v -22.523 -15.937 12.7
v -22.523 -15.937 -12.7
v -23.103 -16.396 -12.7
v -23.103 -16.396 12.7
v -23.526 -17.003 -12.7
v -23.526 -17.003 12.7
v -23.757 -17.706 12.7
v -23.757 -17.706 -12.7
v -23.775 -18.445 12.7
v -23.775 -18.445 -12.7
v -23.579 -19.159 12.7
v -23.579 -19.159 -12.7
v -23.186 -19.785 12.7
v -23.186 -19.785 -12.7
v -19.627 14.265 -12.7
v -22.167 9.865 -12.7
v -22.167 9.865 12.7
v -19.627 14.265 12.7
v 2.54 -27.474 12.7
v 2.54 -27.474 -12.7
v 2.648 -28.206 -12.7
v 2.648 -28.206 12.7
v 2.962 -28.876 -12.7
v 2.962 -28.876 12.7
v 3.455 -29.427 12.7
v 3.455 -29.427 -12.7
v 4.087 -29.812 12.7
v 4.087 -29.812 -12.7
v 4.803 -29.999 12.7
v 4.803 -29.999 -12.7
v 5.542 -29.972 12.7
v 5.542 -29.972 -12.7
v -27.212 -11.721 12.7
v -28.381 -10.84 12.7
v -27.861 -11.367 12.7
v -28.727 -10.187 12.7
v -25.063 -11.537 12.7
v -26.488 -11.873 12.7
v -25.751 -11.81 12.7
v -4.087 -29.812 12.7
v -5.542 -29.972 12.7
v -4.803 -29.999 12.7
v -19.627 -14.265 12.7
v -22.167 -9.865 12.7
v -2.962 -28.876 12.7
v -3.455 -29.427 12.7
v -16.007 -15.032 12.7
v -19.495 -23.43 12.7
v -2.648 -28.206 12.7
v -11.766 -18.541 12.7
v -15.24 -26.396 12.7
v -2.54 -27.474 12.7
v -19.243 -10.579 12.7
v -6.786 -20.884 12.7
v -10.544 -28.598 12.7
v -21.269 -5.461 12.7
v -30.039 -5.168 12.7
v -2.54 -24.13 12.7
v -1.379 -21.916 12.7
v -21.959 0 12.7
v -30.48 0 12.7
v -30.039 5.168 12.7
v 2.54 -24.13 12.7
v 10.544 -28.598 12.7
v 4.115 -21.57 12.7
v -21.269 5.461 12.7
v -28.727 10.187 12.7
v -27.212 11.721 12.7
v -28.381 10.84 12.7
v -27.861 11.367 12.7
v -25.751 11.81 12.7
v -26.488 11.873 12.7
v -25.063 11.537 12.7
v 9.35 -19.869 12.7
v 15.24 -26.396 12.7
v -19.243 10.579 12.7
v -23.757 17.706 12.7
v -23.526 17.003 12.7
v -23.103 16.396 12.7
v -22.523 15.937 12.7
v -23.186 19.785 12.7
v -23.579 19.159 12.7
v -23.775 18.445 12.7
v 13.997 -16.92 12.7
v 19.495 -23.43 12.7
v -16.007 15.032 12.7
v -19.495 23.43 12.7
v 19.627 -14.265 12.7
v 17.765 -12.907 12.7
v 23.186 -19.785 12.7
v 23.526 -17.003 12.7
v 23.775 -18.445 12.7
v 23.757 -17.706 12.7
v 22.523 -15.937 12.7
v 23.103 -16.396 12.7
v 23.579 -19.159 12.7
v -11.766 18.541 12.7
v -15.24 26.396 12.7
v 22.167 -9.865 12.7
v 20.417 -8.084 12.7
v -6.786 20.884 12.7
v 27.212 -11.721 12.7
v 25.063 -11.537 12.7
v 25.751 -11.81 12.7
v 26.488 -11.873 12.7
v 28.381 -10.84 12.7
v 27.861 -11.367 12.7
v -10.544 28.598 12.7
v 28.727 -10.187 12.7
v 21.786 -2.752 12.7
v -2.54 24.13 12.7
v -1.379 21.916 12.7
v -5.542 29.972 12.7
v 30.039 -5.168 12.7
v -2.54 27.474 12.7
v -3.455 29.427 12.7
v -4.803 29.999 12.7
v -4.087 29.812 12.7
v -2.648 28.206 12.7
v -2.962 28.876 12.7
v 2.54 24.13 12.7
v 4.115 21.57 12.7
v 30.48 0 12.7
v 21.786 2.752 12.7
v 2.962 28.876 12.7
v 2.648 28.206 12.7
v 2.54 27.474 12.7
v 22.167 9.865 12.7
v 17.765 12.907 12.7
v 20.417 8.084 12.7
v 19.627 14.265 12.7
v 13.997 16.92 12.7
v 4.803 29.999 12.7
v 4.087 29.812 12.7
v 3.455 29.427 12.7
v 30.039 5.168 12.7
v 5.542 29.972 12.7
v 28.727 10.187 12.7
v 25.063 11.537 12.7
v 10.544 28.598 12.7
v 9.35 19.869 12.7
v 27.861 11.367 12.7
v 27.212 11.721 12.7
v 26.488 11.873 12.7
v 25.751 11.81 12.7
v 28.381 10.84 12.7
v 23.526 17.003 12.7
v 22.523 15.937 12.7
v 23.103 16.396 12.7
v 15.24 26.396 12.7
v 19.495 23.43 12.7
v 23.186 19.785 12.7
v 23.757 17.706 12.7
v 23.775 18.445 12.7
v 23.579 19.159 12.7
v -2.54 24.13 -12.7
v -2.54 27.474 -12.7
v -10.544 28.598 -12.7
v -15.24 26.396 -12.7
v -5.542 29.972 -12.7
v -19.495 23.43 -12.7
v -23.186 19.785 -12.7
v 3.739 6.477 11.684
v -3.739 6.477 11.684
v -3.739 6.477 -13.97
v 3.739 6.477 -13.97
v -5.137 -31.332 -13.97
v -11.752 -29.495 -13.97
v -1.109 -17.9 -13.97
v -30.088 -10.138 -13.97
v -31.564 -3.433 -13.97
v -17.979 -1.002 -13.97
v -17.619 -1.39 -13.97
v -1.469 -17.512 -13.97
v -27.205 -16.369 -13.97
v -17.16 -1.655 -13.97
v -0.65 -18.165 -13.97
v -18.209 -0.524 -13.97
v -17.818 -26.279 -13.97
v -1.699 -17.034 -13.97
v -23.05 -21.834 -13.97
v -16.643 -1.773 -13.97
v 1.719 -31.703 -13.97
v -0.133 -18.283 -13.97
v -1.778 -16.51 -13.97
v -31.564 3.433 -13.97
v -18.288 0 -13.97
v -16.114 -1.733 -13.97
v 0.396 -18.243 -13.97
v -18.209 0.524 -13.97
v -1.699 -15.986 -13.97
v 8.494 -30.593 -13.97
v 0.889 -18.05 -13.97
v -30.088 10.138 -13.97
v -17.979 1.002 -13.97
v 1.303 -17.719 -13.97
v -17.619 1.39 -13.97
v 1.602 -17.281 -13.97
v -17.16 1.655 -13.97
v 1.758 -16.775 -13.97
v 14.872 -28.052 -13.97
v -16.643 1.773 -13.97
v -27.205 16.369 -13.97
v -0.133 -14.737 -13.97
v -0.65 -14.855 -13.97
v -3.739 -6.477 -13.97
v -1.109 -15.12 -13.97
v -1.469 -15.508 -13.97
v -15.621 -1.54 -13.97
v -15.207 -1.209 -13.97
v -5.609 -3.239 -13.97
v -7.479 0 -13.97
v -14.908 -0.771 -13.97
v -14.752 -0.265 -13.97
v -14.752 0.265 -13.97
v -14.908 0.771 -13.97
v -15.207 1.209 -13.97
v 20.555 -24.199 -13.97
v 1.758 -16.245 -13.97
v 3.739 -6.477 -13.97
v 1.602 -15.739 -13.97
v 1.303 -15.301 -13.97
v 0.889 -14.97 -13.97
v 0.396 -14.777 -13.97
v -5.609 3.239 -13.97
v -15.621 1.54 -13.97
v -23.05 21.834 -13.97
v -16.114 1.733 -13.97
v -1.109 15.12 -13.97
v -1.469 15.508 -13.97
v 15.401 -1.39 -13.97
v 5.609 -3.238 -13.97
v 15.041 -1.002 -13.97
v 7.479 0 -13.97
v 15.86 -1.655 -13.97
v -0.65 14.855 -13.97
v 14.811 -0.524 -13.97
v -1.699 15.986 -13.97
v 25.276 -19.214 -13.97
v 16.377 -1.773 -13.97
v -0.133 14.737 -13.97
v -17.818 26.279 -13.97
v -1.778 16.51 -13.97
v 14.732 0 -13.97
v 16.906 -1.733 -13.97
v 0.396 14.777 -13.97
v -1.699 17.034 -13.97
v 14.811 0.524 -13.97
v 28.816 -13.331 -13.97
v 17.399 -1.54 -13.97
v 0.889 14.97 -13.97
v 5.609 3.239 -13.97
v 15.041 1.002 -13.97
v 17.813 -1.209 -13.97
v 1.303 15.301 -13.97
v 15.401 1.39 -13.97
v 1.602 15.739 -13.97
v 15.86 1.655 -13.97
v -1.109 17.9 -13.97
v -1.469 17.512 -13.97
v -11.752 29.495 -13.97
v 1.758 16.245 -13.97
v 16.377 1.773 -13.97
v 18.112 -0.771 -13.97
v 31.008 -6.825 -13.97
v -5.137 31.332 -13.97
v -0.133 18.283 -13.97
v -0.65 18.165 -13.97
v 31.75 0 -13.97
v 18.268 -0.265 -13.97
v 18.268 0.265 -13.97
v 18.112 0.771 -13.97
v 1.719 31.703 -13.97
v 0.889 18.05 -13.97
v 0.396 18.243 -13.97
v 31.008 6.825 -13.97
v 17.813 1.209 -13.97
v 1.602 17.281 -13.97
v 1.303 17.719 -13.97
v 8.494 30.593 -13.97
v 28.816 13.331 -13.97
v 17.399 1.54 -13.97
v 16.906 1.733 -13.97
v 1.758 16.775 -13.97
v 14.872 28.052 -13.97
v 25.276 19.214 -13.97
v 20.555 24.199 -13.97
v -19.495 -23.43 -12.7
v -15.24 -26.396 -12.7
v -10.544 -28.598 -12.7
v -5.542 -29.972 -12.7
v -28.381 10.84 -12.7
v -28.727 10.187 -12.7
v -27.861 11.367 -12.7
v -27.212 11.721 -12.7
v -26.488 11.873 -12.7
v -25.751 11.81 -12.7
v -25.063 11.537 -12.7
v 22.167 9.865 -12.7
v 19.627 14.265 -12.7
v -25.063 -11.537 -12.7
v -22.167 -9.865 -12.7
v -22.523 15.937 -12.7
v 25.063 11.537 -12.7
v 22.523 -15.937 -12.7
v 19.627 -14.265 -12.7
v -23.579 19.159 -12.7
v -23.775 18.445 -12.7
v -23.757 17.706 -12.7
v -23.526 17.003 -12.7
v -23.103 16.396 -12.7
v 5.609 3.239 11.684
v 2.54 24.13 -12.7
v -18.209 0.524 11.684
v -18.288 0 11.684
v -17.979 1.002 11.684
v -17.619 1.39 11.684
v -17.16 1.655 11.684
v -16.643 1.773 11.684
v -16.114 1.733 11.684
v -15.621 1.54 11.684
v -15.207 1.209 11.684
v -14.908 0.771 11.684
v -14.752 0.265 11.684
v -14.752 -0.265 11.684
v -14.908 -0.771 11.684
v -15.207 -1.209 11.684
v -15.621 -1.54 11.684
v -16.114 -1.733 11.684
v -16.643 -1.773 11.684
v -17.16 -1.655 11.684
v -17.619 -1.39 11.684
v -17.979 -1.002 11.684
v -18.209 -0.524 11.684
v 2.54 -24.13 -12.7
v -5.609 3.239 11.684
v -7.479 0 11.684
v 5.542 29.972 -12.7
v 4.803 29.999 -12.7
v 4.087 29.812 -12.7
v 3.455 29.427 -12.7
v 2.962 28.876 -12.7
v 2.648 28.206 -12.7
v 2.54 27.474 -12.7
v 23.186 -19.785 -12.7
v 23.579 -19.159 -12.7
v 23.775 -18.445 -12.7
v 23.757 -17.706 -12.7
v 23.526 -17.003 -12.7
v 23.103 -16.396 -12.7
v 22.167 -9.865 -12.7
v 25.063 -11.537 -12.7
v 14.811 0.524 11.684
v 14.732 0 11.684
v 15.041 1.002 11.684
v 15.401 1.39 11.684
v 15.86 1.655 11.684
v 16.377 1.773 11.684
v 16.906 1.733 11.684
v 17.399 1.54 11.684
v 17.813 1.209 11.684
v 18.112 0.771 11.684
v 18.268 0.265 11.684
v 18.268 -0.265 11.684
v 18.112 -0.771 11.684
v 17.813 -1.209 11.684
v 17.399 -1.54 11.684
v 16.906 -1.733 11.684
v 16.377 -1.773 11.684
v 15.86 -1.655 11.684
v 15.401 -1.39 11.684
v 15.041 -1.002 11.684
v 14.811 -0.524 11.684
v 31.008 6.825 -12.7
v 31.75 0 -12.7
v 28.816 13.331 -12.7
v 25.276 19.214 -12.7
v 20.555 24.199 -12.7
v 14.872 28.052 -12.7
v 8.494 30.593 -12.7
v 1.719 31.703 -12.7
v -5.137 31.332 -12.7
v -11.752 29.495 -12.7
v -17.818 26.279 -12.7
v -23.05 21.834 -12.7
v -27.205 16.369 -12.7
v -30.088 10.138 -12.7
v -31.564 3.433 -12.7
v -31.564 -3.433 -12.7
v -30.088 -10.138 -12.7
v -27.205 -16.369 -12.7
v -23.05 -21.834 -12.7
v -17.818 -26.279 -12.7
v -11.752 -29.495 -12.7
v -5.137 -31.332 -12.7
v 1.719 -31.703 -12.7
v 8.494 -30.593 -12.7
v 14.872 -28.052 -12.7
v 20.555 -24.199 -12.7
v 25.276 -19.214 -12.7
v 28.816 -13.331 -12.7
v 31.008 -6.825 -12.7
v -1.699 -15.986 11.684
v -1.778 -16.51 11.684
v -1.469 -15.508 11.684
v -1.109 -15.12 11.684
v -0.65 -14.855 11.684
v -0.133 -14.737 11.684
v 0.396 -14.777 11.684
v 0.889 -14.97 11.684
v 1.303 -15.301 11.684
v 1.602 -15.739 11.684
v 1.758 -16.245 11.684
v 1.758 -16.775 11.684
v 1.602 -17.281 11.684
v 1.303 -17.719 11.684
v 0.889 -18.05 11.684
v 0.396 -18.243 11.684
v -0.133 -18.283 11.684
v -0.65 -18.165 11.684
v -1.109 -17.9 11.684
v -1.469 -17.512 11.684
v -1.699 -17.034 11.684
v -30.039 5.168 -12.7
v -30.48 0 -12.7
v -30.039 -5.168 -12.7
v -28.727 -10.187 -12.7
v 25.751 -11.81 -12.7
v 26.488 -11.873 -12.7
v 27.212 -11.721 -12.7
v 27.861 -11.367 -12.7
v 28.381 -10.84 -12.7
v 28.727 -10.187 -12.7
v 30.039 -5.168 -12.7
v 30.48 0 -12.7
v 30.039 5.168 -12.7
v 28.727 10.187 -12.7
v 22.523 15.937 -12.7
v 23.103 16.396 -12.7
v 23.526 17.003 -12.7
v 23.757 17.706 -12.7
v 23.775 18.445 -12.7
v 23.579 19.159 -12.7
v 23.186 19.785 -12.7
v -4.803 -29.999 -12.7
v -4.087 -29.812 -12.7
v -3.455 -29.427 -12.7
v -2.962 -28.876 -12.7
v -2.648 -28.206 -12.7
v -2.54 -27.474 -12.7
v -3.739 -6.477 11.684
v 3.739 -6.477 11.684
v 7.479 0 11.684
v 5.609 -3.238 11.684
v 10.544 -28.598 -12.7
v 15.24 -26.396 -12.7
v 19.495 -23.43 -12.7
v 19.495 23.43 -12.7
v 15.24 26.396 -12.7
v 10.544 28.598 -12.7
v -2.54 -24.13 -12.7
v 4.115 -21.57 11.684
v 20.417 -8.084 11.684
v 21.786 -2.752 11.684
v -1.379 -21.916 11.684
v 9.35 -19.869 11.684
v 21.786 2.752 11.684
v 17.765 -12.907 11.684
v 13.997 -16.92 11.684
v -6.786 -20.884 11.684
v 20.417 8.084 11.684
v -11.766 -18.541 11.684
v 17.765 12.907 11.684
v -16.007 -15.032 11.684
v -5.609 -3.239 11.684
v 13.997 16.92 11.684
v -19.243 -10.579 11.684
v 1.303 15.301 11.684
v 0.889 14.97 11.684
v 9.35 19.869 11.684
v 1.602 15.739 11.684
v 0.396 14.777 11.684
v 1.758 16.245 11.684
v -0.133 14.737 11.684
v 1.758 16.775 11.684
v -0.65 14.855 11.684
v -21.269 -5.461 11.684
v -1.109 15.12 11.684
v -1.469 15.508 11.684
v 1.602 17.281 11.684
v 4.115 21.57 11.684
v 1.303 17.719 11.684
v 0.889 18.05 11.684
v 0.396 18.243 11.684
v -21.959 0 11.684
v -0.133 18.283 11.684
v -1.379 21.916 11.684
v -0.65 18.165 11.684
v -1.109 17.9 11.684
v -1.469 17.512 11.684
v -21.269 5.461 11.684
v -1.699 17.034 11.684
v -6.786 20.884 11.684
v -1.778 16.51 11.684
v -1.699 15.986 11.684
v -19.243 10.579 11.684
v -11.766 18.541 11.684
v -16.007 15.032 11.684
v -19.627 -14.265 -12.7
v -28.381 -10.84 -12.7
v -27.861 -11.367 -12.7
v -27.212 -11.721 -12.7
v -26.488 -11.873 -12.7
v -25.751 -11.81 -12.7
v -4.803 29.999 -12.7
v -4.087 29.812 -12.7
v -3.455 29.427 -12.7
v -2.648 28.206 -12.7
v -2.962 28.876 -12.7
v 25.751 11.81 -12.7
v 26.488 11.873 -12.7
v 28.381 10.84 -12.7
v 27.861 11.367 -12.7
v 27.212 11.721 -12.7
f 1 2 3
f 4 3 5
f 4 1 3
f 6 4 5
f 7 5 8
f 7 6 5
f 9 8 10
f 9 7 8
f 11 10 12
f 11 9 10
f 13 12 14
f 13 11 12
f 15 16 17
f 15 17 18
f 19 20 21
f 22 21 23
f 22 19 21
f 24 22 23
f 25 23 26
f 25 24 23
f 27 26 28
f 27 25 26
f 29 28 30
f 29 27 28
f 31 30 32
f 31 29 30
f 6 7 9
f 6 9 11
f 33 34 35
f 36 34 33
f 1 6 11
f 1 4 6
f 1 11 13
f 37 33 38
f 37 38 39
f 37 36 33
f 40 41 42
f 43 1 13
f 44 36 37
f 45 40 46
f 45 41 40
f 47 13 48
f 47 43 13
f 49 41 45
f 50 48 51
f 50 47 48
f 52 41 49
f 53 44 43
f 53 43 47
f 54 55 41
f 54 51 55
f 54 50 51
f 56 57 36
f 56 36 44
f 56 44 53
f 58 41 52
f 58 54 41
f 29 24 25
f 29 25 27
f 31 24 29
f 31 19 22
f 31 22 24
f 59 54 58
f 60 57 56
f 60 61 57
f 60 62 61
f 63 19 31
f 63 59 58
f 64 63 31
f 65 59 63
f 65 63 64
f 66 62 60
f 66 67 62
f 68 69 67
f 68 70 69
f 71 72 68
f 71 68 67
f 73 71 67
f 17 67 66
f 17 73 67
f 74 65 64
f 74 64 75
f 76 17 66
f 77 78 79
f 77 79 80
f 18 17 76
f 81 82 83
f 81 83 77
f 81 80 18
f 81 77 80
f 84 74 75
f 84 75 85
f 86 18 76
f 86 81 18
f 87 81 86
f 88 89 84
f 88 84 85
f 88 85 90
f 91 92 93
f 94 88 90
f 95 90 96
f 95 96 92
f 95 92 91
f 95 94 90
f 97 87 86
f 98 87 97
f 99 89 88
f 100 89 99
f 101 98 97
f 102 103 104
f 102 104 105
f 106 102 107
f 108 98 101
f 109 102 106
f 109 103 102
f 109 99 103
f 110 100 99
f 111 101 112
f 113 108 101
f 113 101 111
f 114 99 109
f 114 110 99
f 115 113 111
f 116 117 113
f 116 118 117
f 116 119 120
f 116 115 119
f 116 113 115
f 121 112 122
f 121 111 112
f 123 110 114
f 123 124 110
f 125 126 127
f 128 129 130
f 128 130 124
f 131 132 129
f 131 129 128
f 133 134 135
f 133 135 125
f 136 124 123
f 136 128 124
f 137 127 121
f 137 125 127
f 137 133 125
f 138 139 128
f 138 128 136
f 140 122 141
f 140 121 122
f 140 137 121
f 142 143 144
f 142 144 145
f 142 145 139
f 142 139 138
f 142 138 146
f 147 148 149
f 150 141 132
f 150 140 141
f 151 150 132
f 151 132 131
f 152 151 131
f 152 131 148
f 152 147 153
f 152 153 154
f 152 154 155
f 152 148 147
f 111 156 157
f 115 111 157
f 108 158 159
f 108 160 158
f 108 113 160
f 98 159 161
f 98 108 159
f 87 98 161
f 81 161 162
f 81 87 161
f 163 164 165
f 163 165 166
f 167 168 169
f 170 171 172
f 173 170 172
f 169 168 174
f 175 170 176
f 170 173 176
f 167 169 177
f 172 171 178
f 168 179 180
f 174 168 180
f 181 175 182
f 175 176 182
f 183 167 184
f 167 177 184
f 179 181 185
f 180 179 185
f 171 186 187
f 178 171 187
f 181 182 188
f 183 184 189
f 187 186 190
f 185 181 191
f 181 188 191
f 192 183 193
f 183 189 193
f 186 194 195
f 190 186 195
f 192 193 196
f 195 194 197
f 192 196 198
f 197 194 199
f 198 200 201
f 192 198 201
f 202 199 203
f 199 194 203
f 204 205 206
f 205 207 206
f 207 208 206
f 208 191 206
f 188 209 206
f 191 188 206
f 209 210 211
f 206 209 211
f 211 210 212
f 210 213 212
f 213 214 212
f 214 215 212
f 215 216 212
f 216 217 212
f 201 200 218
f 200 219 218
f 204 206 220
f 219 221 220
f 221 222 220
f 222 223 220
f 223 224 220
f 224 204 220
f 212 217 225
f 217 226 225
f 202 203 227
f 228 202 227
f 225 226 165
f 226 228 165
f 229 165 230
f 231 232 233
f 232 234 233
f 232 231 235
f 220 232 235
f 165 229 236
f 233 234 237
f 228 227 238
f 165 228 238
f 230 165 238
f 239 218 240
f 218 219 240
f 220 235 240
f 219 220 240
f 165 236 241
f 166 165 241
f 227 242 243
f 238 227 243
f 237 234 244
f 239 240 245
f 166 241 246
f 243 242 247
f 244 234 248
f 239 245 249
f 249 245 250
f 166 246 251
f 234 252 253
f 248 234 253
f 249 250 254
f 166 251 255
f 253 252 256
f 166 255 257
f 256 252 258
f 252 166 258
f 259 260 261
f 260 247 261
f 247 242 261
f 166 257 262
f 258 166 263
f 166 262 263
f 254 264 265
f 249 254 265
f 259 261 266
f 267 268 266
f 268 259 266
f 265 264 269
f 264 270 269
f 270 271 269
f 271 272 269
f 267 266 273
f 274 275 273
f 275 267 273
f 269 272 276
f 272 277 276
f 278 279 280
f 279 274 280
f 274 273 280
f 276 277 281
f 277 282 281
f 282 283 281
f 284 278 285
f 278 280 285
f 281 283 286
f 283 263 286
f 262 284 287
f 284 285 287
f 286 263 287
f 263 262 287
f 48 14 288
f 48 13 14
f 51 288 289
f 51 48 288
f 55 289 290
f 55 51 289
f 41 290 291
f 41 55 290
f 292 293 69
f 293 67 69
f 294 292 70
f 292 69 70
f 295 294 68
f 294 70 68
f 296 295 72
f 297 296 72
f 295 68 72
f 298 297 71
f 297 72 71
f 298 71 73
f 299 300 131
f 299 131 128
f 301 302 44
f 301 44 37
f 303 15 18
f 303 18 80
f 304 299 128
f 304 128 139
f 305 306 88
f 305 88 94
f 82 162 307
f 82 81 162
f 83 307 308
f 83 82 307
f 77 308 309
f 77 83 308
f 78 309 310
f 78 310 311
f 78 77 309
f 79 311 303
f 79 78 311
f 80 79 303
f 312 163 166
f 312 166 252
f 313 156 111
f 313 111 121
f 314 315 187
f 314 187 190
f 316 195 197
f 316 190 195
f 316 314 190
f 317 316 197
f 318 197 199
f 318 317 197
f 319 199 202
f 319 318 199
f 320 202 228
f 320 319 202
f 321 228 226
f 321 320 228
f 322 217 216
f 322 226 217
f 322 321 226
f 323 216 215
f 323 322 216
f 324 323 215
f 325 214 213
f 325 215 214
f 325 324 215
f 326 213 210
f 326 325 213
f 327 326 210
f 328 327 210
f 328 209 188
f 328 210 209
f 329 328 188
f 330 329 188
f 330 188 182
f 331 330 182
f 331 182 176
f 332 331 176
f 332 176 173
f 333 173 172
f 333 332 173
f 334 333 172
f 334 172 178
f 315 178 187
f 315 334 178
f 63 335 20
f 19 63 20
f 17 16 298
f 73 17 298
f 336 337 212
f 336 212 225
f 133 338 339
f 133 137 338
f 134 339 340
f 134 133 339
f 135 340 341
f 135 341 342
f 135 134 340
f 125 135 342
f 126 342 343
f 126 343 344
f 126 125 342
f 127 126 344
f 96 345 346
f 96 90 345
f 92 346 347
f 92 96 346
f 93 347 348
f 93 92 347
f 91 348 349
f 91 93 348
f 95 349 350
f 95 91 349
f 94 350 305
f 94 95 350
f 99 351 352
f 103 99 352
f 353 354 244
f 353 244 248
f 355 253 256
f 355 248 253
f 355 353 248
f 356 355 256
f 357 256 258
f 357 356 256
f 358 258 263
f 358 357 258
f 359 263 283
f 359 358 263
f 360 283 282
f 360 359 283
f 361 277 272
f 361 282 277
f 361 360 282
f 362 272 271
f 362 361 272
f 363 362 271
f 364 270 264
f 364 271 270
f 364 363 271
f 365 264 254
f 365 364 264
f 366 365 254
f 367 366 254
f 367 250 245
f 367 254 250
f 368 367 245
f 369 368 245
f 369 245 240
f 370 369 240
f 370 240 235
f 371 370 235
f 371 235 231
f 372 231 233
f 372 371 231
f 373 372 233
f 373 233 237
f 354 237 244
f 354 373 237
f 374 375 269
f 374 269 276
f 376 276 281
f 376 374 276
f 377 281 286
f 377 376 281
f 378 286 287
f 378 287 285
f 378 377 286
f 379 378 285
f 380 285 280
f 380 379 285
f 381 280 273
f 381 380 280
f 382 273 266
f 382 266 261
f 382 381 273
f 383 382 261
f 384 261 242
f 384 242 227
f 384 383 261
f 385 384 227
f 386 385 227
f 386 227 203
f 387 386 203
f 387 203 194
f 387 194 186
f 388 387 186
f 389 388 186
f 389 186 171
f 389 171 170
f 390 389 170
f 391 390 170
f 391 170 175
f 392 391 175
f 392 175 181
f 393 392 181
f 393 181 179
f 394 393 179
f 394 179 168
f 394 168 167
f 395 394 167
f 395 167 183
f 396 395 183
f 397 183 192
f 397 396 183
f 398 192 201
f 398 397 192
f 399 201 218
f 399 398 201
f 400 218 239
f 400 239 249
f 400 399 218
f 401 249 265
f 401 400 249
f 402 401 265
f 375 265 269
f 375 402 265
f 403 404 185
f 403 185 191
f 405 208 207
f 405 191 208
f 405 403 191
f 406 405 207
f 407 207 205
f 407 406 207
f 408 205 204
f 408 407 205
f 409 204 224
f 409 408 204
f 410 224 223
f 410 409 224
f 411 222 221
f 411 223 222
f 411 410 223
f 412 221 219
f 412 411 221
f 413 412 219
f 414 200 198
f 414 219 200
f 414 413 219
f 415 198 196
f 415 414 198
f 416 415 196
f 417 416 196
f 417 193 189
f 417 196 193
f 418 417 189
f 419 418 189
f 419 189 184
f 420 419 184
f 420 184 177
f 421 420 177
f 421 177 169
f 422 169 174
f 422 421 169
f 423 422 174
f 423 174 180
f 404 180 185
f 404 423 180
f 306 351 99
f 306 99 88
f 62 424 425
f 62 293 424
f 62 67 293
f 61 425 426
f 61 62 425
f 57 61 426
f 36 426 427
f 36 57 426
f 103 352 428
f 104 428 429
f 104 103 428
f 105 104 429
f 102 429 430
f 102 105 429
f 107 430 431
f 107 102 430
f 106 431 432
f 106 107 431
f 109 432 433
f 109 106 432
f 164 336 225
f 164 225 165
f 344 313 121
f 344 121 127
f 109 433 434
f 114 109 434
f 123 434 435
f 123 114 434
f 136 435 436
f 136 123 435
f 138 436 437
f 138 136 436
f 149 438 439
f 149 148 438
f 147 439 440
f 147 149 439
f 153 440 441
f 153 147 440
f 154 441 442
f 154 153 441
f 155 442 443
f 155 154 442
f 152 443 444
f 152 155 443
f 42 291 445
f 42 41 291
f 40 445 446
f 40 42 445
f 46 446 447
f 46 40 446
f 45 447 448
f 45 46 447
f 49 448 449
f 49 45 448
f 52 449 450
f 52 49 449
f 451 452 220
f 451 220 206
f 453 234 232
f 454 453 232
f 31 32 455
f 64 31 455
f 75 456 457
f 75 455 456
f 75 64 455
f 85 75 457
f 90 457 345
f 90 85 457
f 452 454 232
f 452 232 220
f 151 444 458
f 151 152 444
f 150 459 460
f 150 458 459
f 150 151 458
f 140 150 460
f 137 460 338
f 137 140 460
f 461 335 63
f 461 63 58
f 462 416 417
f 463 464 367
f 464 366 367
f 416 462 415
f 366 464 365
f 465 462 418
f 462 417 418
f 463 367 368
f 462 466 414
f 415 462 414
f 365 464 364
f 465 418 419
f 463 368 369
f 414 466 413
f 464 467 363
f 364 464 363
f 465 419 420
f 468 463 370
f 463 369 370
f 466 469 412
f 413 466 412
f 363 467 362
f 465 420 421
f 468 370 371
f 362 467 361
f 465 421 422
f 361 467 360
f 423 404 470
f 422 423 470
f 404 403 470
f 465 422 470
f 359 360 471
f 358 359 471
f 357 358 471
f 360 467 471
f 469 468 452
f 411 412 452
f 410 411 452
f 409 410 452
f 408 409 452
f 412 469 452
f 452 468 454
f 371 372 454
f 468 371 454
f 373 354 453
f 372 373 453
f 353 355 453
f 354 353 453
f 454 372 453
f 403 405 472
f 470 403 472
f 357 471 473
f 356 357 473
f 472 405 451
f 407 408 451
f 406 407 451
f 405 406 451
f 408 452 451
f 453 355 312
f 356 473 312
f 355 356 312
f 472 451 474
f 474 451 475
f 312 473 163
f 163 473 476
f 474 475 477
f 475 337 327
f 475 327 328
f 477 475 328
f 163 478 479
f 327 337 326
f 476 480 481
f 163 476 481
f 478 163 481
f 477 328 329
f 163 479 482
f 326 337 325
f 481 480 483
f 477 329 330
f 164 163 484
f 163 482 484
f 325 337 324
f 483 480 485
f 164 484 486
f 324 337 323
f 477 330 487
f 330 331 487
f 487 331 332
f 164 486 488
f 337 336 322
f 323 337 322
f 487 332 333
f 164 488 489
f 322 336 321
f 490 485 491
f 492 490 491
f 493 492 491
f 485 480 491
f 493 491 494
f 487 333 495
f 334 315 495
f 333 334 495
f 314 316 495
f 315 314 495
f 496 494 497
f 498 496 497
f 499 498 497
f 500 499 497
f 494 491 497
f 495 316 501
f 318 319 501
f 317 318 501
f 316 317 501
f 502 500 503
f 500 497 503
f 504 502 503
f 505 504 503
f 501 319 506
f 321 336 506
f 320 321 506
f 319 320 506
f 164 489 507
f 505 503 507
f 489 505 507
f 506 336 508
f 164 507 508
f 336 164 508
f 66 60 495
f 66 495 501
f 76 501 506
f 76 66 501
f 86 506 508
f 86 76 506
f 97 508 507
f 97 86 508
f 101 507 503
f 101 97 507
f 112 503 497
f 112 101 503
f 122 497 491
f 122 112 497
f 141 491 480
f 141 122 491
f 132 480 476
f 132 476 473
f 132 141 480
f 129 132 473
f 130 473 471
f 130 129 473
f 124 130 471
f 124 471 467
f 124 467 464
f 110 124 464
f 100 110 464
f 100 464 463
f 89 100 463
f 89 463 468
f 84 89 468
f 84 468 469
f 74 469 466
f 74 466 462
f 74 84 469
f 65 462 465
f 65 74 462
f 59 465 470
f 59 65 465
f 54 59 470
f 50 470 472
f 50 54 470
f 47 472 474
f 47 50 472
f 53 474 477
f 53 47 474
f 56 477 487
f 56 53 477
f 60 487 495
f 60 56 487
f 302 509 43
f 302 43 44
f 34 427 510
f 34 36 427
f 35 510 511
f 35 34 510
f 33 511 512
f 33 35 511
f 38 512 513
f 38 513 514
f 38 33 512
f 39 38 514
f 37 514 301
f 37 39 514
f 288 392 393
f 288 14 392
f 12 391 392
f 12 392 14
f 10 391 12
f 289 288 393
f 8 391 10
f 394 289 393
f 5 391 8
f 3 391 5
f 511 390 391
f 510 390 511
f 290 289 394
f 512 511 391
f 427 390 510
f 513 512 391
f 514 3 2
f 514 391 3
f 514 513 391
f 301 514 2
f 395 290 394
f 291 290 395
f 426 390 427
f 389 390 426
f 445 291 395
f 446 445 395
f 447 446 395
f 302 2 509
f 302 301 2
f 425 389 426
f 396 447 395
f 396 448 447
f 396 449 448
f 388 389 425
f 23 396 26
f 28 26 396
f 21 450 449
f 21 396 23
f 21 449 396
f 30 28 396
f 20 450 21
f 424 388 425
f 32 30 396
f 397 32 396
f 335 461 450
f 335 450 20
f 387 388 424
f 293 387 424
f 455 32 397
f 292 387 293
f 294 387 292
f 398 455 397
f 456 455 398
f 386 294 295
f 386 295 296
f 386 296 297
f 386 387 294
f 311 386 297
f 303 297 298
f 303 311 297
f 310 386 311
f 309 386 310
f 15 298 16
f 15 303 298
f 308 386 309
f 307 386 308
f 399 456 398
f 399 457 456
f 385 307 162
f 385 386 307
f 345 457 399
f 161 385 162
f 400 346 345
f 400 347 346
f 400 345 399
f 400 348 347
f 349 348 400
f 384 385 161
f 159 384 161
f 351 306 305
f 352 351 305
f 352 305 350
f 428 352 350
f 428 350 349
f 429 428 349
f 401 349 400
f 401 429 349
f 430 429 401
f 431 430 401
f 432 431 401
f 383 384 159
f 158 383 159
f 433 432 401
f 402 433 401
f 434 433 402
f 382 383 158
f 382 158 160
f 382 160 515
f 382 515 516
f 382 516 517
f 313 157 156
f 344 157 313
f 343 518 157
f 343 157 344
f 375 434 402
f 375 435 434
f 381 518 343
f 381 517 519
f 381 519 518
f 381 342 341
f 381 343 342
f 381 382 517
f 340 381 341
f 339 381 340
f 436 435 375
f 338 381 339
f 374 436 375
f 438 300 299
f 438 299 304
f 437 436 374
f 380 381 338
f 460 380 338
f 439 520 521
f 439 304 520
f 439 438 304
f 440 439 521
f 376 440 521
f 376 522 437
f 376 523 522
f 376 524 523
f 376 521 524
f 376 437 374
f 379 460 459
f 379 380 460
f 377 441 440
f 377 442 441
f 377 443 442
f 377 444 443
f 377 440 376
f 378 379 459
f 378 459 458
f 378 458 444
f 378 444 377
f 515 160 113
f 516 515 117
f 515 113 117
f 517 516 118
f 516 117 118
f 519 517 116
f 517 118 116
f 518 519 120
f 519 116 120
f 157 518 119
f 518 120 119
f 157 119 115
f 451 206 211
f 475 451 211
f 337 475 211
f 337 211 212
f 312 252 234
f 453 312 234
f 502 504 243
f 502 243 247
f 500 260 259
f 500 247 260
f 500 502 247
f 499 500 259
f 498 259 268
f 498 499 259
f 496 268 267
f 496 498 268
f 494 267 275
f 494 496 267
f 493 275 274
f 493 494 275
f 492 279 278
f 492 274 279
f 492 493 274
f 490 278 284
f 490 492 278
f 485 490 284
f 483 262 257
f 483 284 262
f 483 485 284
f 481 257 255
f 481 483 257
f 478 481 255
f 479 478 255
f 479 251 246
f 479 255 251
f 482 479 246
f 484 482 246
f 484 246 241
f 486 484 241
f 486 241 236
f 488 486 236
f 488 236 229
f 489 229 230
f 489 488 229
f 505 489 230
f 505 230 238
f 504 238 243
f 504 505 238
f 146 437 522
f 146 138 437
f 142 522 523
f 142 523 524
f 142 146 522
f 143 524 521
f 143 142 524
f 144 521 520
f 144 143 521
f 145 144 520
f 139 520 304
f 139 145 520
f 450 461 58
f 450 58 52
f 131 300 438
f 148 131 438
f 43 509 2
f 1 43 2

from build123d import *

# Parameters (mm, degrees)
SKETCH1_R                = 30.48
BOSS_EXTRUDE1_DEPTH      = 12.7
SKETCH2_R                = 31.75
BOSS_EXTRUDE2_DEPTH      = 1.27
SKETCH3_W                = 5.08
SKETCH3_H                = 7.62
CUT_EXTRUDE1_DEPTH       = 52.587643869
FILLET1_R                = 2.54
CIRPATTERN1_COUNT        = 6
FILLET1_OF_CIRPATTERN1_R = 2.54
CUT_EXTRUDE4_DEPTH       = 53.224648395
CUT_EXTRUDE4_DEPTH_BACK  = 53.224648395
CUT_EXTRUDE5_DEPTH       = 53.224648395
CUT_EXTRUDE5_DEPTH_BACK  = 53.224648395
SKETCH7_R                = 1.778
SKETCH8_R                = 21.95890497
CUT_EXTRUDE6_DEPTH       = 1.016


with BuildPart() as part:
    # Sketch1 → Boss-Extrude1 (new, symmetric)
    with BuildSketch(Plane.XY):
        Circle(SKETCH1_R)
    extrude(amount=BOSS_EXTRUDE1_DEPTH, both=True)

    # Sketch2 → Boss-Extrude2 (add)
    with BuildSketch(Plane.XY.offset(-12.7)):
        Circle(SKETCH2_R)
    extrude(amount=-BOSS_EXTRUDE2_DEPTH)

    # Sketch3 → Cut-Extrude1 (cut, through all)
    with BuildSketch(Plane.XY.offset(-12.7)):
        with Locations((0, 27.94)):
            Rectangle(SKETCH3_W, SKETCH3_H)
    cut_extrude1 = extrude(amount=CUT_EXTRUDE1_DEPTH, mode=Mode.SUBTRACT)

    # Fillet1
    fillet1_edges = [part.edges().sort_by_distance(p)[0] for p in [
        (2.54, 30.373982287, 0),
        (-2.54, 30.373982287, 0),
    ]]
    fillet(fillet1_edges, radius=FILLET1_R)

    # CirPattern1: Cut-Extrude1 ×6 about axis
    cirpattern1_axis = Axis((0, 0, 20.0025), (0, 0, -1))
    for i in range(1, CIRPATTERN1_COUNT):
        add(cut_extrude1.rotate(cirpattern1_axis, i * 360 / CIRPATTERN1_COUNT), mode=Mode.SUBTRACT)

    # Fillet1 of CirPattern1
    fillet1_of_cirpattern1_edges = [part.edges().sort_by_distance(p)[0] for p in [
        (27.574640275, 12.987286618, 0),
        (25.034640275, 17.386695669, 0),
        (25.034640275, -17.386695669, 0),
        (27.574640275, -12.987286618, 0),
        (-2.54, -30.373982287, 0),
        (2.54, -30.373982287, 0),
        (-27.574640275, -12.987286618, 0),
        (-25.034640275, -17.386695669, 0),
        (-25.034640275, 17.386695669, 0),
        (-27.574640275, 12.987286618, 0),
    ]]
    fillet(fillet1_of_cirpattern1_edges, radius=FILLET1_OF_CIRPATTERN1_R)

    # Sketch6 → Cut-Extrude4 (cut, two sides: drawn at the far end of the back side and taken through both)
    with BuildSketch(Plane(origin=(0, 0, -13.97), x_dir=(-1, 0, 0), z_dir=(0, 0, -1)).offset(-CUT_EXTRUDE4_DEPTH_BACK)):
        Polygon((-3.739497694, 6.477), (-7.478995387, 0), (-3.739497694, -6.477), (3.739497694, -6.477), (7.478995387, 0), (3.739497694, 6.477), align=None)
    extrude(amount=CUT_EXTRUDE4_DEPTH + CUT_EXTRUDE4_DEPTH_BACK, mode=Mode.SUBTRACT)

    # Sketch7 → Cut-Extrude5 (cut, two sides: drawn at the far end of the back side and taken through both)
    with BuildSketch(Plane(origin=(0, 0, -13.97), x_dir=(-1, 0, 0), z_dir=(0, 0, -1)).offset(-CUT_EXTRUDE5_DEPTH_BACK)):
        with Locations((-16.51, 0)):
            Circle(SKETCH7_R)
        with Locations((0, 16.51)):
            Circle(SKETCH7_R)
        with Locations((16.51, 0)):
            Circle(SKETCH7_R)
        with Locations((0, -16.51)):
            Circle(SKETCH7_R)
    extrude(amount=CUT_EXTRUDE5_DEPTH + CUT_EXTRUDE5_DEPTH_BACK, mode=Mode.SUBTRACT)

    # Sketch8 → Cut-Extrude6 (cut)
    with BuildSketch(Plane(origin=(0, 0, 12.7), x_dir=(-1, 0, 0), z_dir=(0, 0, -1))):
        Circle(SKETCH8_R)
    extrude(amount=CUT_EXTRUDE6_DEPTH, mode=Mode.SUBTRACT)


solid = part.part
